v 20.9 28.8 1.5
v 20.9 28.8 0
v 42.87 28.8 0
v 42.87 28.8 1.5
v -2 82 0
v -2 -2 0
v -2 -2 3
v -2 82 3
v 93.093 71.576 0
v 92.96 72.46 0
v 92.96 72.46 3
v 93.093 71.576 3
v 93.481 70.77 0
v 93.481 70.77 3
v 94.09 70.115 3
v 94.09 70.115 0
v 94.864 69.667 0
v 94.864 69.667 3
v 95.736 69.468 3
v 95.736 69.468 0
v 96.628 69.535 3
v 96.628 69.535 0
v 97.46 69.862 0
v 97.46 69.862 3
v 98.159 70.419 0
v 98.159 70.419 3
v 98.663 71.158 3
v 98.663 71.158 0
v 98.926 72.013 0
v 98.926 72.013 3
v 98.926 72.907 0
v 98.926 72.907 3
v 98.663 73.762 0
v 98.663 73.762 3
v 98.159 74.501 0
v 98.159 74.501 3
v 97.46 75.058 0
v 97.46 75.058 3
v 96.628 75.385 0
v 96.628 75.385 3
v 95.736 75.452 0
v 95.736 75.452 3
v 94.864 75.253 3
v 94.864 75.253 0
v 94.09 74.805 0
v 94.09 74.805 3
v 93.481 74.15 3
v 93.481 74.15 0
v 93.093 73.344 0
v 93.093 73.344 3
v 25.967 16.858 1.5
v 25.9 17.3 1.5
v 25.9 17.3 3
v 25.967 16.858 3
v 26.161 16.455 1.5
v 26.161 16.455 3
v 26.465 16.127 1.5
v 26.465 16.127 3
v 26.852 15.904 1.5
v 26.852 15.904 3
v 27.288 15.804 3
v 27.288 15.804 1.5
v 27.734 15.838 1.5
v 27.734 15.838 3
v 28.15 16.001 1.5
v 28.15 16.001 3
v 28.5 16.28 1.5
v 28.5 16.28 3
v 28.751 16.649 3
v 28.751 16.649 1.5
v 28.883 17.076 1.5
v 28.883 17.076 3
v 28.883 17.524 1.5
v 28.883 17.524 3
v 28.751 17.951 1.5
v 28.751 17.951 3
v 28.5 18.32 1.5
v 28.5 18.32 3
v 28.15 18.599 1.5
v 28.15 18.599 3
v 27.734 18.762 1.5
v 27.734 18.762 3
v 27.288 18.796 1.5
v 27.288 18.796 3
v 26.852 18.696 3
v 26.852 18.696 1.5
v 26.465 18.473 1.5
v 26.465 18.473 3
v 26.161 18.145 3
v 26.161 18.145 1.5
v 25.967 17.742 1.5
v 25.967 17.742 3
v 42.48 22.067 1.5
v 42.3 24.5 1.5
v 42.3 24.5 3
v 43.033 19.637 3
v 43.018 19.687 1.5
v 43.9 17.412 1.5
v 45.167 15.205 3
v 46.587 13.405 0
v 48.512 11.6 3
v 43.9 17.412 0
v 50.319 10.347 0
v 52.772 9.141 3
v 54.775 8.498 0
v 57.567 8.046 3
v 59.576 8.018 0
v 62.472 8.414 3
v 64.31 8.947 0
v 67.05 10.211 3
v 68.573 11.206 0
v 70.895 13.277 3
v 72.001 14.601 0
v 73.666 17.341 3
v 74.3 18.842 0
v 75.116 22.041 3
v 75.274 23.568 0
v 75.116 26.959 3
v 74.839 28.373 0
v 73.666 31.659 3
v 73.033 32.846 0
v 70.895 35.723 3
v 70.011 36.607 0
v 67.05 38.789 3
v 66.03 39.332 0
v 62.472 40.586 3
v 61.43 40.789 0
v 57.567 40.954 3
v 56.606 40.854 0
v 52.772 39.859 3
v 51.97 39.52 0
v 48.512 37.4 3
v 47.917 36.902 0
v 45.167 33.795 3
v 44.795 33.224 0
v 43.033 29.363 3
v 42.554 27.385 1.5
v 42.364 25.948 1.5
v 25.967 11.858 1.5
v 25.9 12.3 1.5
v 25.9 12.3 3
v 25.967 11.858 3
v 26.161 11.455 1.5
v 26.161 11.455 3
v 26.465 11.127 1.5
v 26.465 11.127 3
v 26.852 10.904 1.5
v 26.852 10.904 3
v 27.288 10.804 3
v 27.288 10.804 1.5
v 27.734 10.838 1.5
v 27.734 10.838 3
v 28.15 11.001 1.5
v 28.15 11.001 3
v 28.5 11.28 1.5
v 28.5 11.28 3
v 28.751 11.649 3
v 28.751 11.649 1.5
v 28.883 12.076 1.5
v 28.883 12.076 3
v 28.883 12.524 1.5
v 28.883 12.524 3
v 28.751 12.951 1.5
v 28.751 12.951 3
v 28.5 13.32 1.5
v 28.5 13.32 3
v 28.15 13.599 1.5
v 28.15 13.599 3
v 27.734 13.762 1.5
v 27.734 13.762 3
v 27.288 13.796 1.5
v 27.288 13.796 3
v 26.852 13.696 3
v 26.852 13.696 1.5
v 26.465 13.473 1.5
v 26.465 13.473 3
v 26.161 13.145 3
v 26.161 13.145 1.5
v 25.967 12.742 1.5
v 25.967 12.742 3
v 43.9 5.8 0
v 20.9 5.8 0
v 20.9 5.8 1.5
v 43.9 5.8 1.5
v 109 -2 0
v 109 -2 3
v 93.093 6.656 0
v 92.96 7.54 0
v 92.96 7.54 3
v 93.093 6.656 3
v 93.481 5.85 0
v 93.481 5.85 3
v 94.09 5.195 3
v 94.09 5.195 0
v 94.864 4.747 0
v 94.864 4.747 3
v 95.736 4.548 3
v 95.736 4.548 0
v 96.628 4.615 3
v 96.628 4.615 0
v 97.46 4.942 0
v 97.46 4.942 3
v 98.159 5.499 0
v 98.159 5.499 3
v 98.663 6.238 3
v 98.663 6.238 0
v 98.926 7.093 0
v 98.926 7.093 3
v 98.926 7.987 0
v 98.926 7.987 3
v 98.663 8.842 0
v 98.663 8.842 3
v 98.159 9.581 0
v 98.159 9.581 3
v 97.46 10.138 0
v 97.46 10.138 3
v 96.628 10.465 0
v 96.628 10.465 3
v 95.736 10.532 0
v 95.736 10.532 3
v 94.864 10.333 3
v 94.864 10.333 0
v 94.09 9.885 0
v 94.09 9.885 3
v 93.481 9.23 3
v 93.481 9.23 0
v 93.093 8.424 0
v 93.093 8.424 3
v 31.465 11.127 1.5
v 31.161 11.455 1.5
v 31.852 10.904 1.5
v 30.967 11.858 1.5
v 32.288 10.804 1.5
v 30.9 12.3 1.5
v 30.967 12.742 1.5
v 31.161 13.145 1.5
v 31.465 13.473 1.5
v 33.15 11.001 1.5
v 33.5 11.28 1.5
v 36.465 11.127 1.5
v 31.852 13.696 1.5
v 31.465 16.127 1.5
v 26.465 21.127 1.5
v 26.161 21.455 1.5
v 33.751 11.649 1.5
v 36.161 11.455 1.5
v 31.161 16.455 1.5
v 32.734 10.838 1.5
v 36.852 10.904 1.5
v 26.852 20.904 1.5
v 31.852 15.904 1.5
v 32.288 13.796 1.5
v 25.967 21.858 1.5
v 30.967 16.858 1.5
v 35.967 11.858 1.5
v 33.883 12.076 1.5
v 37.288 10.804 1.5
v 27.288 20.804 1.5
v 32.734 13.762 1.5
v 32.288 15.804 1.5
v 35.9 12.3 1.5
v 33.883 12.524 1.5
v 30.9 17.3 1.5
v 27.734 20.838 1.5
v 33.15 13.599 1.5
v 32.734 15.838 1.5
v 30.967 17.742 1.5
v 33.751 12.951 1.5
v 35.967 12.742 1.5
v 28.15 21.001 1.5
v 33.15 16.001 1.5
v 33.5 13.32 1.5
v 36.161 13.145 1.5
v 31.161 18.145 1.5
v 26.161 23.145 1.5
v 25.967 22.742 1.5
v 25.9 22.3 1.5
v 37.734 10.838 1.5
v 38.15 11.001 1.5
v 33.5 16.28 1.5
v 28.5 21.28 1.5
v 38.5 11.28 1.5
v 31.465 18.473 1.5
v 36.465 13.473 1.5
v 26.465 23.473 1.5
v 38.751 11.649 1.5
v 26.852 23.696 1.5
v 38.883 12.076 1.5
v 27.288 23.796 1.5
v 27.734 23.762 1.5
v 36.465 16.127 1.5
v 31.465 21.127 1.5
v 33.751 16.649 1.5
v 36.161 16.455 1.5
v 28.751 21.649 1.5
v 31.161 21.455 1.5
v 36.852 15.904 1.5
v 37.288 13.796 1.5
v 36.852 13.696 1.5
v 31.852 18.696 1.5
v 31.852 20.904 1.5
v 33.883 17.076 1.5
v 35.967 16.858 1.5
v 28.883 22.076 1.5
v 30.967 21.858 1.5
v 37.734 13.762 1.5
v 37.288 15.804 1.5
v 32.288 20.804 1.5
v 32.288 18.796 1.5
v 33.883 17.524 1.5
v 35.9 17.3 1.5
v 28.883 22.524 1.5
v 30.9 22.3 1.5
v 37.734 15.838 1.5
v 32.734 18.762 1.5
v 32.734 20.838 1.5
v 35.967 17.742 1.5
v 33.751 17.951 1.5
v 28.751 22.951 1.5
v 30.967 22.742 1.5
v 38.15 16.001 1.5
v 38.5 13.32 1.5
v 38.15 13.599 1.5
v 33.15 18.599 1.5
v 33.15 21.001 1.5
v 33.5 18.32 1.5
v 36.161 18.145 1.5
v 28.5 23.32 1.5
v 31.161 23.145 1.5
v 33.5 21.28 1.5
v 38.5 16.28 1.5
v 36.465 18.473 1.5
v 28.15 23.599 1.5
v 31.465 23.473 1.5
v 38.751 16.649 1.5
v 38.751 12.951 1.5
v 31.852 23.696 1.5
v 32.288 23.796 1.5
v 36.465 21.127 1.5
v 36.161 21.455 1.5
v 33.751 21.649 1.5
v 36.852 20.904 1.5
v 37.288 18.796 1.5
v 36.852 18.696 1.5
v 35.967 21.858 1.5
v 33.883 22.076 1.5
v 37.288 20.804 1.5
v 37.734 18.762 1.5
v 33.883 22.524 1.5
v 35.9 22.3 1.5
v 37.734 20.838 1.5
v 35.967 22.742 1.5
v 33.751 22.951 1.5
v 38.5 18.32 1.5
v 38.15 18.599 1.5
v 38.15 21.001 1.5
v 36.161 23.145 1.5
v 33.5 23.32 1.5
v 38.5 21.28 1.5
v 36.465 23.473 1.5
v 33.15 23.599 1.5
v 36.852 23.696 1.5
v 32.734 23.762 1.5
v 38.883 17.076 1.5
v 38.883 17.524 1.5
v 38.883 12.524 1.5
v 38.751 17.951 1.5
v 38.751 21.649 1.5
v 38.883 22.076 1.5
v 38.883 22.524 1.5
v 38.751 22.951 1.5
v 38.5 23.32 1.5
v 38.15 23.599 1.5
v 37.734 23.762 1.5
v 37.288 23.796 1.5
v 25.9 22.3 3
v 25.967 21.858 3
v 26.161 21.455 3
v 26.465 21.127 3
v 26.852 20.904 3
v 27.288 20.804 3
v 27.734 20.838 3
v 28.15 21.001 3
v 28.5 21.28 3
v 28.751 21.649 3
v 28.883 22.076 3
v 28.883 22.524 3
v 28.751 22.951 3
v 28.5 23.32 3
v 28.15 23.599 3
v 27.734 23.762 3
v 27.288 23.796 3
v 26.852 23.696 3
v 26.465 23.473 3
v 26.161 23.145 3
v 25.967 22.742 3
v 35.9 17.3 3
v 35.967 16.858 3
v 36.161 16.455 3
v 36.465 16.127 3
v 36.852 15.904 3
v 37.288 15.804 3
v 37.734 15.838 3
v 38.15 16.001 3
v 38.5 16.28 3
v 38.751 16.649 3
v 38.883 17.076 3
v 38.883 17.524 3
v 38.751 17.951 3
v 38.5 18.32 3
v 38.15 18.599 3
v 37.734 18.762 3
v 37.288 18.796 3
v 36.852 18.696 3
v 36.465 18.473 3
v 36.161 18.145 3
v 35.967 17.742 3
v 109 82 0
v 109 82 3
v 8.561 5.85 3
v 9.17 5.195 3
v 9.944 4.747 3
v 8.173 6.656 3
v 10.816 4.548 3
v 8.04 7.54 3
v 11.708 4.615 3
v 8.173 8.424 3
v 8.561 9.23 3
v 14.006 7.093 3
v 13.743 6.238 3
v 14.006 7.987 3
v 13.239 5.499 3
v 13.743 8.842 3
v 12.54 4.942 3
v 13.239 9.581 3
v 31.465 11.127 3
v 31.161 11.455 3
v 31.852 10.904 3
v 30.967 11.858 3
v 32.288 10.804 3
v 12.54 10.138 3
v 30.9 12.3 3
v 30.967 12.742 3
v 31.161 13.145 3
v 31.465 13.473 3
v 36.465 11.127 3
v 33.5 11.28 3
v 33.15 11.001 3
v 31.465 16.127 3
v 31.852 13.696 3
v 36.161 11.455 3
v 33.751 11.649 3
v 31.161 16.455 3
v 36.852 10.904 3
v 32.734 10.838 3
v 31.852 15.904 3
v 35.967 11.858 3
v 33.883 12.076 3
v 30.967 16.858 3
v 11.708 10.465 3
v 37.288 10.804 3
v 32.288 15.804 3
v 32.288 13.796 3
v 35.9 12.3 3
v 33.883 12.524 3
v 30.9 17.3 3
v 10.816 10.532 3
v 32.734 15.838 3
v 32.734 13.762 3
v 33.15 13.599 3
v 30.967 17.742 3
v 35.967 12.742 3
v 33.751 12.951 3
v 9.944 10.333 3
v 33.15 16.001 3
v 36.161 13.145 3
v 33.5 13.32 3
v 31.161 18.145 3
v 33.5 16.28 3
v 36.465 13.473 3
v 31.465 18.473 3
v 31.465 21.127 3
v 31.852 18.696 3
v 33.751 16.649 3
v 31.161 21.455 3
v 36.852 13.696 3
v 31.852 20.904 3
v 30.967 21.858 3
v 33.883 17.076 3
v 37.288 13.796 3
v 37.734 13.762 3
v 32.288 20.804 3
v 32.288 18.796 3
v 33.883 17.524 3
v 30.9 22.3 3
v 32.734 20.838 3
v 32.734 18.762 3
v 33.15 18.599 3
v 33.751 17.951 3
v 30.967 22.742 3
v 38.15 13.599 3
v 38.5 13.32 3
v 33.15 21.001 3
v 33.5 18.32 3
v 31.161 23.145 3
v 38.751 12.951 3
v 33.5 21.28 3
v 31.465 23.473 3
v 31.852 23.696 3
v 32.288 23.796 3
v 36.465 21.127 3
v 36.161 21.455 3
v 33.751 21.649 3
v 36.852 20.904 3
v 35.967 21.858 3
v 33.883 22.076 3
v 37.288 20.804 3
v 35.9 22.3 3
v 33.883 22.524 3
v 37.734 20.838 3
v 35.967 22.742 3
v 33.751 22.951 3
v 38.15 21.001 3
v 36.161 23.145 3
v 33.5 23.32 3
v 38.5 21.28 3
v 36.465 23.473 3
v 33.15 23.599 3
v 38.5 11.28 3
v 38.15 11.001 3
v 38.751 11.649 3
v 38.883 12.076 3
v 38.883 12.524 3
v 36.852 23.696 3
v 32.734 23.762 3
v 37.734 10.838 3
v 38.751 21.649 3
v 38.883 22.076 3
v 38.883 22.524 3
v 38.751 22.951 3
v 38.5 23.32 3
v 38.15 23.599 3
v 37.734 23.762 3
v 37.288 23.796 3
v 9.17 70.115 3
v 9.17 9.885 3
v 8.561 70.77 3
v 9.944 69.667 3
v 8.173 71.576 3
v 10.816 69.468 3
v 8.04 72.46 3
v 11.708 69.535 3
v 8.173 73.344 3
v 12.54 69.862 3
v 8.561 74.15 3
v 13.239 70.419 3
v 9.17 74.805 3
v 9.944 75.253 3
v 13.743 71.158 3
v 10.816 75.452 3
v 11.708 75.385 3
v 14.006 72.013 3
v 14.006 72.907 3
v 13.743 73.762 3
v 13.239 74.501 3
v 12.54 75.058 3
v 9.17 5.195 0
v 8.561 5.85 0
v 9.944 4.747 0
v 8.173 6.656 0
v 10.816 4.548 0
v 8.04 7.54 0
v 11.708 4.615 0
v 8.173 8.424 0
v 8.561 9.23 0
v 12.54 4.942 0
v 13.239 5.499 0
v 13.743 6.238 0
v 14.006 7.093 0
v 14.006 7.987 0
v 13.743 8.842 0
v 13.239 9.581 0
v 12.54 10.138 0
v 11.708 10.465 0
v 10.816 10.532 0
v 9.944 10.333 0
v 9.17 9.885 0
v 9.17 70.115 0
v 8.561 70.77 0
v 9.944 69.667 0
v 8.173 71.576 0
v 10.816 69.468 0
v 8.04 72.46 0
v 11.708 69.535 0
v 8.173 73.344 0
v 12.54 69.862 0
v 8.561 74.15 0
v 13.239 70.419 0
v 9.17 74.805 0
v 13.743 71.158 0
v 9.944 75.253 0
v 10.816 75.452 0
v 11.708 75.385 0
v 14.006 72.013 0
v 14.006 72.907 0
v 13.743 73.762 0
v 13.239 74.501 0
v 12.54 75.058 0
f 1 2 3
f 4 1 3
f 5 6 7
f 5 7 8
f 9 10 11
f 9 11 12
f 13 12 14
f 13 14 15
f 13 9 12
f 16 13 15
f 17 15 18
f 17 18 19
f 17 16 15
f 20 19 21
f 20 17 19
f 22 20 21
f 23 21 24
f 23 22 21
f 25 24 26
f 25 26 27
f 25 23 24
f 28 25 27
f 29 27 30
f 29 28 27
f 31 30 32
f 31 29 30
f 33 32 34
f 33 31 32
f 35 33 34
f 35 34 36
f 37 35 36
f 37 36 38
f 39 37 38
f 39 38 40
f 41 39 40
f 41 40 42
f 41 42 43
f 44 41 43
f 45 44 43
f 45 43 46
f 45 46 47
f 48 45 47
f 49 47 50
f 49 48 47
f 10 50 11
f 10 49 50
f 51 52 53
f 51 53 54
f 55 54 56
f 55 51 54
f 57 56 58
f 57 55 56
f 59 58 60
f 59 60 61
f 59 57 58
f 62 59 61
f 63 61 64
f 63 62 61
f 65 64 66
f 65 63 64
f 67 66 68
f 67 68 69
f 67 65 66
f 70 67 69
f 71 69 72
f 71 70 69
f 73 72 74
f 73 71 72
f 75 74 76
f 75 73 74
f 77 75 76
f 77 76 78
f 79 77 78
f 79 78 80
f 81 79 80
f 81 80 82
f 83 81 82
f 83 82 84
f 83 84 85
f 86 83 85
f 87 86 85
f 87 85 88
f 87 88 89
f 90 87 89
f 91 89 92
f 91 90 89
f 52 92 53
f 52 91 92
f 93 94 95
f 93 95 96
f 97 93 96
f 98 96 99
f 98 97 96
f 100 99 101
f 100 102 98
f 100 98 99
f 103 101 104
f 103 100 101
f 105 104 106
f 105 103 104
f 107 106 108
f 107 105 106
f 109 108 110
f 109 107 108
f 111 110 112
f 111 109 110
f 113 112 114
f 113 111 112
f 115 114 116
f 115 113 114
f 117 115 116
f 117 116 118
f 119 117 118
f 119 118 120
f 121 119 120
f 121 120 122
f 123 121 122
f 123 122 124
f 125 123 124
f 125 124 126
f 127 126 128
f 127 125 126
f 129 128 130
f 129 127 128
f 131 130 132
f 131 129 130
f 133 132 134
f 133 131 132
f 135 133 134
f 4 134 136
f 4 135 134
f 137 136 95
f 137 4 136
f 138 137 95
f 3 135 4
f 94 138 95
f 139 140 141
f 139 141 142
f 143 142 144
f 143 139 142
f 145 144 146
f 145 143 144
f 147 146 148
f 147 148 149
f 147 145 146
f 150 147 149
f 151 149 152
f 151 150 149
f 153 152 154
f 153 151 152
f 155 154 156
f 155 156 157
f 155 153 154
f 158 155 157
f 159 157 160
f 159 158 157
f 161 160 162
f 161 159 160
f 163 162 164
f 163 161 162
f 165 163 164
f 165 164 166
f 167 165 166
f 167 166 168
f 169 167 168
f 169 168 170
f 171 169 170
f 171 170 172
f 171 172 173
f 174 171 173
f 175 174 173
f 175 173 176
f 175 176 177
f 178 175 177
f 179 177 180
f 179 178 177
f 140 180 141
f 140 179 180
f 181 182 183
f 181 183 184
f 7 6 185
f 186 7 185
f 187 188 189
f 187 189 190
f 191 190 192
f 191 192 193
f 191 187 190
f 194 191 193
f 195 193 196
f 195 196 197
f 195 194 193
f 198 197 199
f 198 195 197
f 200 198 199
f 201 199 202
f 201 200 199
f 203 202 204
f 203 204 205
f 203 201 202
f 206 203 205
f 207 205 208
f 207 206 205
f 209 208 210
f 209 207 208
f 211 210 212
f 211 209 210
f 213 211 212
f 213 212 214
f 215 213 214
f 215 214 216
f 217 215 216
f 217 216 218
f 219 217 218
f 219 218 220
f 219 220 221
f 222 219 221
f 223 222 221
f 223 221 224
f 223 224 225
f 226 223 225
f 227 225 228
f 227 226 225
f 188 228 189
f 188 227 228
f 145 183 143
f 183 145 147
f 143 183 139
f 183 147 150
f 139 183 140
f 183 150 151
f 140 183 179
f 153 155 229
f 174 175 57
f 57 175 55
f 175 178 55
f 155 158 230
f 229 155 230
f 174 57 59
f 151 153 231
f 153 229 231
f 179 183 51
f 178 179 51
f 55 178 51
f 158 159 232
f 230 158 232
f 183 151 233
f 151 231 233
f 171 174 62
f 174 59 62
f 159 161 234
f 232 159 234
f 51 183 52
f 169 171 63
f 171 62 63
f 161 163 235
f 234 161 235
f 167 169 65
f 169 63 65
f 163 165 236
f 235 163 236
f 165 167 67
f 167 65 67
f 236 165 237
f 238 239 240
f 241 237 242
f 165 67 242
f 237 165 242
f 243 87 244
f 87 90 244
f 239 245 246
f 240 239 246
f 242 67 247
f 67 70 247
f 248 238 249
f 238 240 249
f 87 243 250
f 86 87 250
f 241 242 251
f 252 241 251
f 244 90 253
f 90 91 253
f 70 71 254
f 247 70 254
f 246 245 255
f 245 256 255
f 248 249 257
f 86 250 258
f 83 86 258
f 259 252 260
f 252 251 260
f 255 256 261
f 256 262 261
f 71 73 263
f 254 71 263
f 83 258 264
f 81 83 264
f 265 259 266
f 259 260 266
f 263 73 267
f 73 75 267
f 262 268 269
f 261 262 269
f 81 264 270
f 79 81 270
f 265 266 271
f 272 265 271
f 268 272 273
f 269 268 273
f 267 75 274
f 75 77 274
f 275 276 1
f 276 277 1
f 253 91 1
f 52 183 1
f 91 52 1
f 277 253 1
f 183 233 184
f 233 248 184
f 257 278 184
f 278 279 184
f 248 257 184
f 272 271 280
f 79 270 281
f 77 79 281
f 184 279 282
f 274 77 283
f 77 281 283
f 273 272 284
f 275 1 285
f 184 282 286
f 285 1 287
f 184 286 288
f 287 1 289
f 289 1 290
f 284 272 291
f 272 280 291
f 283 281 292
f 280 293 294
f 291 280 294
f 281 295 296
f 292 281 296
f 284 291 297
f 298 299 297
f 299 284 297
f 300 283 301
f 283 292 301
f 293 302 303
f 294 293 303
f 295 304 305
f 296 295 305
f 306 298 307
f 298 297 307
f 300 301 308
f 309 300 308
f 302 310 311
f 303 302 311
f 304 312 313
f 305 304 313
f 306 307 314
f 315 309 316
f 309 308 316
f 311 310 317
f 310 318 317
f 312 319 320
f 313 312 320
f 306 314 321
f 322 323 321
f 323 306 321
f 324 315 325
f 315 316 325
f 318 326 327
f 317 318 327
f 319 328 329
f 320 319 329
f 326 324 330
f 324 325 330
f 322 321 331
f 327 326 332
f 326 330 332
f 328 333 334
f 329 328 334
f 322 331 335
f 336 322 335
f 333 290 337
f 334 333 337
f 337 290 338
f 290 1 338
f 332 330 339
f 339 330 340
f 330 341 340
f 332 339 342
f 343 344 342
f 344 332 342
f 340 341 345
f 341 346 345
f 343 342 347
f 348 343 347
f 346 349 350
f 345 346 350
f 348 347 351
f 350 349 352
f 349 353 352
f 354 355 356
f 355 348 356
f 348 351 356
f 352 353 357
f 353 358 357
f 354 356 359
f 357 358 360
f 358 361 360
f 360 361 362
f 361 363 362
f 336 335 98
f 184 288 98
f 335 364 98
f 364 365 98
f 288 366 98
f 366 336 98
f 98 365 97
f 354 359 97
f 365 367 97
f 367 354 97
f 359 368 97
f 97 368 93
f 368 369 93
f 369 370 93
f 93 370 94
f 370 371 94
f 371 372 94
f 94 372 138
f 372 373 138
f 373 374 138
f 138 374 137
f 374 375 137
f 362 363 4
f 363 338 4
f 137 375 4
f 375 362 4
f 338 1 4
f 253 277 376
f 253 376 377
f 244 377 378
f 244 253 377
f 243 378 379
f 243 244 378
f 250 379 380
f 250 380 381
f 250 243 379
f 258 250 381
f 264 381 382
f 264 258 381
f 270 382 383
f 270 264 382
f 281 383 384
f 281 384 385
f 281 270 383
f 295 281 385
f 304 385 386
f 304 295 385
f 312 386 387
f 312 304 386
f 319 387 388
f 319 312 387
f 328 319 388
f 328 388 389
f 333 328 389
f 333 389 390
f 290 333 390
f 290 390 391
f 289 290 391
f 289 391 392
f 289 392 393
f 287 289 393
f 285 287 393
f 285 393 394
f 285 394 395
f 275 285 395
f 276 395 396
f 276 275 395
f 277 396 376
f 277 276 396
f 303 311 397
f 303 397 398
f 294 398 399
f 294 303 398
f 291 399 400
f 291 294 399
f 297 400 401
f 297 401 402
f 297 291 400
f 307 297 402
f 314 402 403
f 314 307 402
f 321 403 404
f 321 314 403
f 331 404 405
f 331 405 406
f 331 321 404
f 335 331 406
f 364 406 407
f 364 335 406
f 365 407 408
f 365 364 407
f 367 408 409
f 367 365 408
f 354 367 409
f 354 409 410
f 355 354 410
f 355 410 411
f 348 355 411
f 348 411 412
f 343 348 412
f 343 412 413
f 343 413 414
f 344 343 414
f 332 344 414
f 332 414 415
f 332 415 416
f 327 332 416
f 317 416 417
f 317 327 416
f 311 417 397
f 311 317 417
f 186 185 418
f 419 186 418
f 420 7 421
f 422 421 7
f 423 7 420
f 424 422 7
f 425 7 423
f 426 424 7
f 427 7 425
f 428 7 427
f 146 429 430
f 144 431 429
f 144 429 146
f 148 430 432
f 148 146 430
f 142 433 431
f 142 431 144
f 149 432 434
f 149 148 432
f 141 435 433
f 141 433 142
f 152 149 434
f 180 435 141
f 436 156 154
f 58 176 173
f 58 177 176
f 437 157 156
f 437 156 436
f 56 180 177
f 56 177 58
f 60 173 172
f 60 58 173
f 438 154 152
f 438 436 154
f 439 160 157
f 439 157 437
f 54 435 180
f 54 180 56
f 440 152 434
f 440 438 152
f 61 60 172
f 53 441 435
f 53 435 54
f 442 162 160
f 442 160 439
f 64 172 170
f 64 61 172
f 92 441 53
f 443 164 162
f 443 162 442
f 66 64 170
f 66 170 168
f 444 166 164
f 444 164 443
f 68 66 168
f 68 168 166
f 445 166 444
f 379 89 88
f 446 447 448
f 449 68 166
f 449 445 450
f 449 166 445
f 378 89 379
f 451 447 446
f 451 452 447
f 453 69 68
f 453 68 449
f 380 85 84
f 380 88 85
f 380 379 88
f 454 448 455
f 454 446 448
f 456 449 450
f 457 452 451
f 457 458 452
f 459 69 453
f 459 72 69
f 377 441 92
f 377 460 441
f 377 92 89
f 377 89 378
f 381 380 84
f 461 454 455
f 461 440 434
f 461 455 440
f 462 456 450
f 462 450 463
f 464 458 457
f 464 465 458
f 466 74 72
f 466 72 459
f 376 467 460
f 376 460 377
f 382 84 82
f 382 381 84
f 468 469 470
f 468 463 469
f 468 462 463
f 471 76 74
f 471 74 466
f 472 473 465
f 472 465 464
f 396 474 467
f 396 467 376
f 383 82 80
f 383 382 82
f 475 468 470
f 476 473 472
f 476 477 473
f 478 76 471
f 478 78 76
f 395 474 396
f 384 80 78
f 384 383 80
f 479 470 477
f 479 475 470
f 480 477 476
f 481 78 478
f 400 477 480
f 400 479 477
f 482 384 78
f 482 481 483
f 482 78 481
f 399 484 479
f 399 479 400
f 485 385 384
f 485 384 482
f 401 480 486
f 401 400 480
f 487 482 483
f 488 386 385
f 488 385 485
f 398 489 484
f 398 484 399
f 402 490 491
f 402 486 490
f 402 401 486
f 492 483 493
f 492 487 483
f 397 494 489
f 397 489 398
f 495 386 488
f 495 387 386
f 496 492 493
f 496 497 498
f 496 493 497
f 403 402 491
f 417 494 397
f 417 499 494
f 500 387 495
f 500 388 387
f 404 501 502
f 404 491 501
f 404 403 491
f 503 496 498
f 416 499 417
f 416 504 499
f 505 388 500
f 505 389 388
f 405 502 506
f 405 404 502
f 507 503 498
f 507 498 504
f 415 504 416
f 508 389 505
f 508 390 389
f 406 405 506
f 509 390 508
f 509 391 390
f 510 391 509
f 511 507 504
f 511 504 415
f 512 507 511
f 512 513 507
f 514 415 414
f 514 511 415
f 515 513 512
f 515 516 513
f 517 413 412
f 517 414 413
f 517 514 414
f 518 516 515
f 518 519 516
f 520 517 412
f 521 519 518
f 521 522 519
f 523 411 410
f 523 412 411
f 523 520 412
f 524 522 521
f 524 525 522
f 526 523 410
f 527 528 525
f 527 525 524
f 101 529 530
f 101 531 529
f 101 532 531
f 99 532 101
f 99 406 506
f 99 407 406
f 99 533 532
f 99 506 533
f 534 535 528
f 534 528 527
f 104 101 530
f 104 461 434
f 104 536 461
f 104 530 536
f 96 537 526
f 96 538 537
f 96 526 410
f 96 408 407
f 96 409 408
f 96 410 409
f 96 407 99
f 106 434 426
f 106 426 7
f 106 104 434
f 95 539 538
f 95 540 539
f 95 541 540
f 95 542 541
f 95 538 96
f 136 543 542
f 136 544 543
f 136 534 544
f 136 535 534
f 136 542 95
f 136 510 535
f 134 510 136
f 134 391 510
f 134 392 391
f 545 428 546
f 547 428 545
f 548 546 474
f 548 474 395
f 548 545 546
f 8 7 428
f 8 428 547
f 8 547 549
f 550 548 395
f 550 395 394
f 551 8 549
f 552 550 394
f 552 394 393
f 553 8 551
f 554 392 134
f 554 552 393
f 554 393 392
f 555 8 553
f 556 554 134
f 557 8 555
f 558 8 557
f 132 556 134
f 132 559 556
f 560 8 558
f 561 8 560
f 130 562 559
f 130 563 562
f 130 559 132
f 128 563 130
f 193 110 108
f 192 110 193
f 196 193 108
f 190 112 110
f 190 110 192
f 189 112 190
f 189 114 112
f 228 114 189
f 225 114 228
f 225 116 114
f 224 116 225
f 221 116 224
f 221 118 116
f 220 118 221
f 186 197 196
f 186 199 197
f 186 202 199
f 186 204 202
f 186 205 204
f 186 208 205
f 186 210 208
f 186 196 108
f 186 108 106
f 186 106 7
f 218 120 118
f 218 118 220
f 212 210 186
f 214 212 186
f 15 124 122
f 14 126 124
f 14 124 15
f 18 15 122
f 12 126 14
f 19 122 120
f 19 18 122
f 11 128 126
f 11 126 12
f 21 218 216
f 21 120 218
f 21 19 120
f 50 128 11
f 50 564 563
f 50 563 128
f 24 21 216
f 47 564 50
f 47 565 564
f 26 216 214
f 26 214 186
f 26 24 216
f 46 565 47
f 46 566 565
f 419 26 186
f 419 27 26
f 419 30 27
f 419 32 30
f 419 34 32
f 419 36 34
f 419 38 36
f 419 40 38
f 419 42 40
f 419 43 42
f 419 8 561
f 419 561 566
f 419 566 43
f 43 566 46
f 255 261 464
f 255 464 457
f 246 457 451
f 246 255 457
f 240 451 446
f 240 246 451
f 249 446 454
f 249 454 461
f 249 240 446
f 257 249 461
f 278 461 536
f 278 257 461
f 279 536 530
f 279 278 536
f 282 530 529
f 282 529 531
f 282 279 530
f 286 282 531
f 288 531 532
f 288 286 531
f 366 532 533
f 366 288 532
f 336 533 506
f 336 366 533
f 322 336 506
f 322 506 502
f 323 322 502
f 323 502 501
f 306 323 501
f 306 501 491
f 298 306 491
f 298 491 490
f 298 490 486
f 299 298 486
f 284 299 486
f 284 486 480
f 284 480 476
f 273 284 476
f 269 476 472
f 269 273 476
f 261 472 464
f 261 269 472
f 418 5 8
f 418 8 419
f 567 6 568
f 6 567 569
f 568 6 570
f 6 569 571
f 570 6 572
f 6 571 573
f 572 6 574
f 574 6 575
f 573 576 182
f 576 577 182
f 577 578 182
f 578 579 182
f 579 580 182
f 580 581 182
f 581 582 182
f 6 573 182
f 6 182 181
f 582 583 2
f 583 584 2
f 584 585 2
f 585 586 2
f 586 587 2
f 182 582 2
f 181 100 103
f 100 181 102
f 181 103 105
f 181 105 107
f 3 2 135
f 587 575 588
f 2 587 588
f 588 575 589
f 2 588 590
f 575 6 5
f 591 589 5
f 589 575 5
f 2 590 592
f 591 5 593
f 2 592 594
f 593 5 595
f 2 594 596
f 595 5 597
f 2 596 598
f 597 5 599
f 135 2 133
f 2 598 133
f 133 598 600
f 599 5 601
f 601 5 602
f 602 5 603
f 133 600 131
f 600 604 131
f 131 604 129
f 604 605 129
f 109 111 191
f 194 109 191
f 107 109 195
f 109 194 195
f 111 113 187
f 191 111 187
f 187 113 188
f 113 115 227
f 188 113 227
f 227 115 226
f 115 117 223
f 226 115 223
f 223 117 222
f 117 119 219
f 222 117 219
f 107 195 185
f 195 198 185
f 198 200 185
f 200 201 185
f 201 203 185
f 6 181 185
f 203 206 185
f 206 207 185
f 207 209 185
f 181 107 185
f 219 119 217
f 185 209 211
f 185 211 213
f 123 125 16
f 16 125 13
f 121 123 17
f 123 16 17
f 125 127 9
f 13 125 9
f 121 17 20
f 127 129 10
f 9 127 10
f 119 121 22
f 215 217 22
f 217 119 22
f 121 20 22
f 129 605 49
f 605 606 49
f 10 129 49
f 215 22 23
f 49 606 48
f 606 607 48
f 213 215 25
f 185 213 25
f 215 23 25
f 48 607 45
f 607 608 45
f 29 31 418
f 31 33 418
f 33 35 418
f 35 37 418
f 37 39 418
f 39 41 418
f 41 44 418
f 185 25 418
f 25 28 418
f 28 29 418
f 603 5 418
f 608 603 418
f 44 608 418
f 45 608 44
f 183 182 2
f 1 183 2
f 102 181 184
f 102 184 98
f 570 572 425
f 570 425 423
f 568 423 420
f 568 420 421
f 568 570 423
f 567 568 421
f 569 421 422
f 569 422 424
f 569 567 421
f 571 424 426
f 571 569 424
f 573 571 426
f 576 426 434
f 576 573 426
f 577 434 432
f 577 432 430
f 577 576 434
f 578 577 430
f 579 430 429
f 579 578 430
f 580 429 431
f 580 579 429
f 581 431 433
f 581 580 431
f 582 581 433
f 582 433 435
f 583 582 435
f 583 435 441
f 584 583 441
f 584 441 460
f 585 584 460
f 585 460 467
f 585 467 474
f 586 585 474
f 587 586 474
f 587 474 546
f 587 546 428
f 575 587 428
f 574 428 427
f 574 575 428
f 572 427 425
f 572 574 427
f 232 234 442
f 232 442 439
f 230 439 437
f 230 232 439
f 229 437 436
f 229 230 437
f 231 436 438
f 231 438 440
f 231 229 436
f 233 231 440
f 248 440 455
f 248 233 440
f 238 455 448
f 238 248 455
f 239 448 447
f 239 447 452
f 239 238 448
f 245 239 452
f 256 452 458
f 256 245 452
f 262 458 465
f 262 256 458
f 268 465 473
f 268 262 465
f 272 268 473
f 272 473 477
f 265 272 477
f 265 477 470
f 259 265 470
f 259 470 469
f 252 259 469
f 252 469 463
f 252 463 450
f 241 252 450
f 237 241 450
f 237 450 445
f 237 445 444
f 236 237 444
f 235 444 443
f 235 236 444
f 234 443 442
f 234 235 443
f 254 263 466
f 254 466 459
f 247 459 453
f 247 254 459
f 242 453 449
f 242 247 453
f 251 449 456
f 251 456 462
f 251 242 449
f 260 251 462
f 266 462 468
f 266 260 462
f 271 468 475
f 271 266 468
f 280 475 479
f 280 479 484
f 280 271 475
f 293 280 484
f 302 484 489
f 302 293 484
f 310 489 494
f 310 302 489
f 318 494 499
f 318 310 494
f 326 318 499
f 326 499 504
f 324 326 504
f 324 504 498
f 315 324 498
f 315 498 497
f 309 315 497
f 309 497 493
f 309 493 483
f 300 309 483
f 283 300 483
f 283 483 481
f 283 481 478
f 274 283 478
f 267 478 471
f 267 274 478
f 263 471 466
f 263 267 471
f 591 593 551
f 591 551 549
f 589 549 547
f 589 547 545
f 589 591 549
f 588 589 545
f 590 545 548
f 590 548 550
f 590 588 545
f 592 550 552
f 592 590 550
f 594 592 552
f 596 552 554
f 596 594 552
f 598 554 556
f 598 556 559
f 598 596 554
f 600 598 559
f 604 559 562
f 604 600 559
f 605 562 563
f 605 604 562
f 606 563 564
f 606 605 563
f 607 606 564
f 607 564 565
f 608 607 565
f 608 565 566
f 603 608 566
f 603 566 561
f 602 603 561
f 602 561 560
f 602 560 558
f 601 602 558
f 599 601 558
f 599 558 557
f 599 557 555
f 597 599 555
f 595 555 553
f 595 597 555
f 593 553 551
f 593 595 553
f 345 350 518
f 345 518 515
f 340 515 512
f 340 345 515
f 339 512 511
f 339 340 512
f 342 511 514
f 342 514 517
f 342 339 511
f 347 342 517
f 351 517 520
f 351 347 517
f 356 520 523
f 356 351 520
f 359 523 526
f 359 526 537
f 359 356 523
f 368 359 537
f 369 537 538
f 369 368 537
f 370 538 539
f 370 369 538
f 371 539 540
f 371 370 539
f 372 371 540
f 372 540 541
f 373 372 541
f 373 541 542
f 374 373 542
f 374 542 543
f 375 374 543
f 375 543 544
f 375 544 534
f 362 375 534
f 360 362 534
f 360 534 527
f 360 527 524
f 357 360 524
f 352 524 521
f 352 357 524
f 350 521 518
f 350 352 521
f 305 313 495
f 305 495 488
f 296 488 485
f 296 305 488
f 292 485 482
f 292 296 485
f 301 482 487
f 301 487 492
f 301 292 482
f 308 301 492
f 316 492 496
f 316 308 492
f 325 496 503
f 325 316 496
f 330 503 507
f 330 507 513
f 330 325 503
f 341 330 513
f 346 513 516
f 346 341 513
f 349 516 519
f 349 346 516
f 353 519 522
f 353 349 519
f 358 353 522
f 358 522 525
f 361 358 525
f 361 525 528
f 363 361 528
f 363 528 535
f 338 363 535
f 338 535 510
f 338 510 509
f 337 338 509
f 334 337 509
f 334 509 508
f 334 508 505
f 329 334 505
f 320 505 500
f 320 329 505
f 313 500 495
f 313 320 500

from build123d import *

# Parameters (mm, degrees)
SKETCH_1_W                                = 111
SKETCH_1_H                                = 84
BOTTOM_LOWER_BASE_PLATE_3MM_DEPTH         = 3
SKETCH_3_R                                = 3
BOTTOM_LOWER_SCREW_6MM_THROUGH_DEPTH      = 3
SKETCH_5_R                                = 16.5
BOTTOM_LOWER_BATTERY_CLEARANCE_33MM_DEPTH = 3
SKETCH_7_W                                = 23
SKETCH_7_H                                = 23
BOTTOM_LOWER_BUZZER_POCKET_1P5MM_DEPTH    = 1.5
BOTTOM_LOWER_BUZZER_SOUND_HOLES_3MM_START = 1.5
SKETCH_9_R                                = 1.5
BOTTOM_LOWER_BUZZER_SOUND_HOLES_3MM_DEPTH = 1.5


with BuildPart() as part:
    # Эскиз1 → bottom_lower_base_plate_3mm (new body)
    with BuildSketch(Plane.XY):
        with Locations((53.5, 40)):
            Rectangle(SKETCH_1_W, SKETCH_1_H)
    extrude(amount=BOTTOM_LOWER_BASE_PLATE_3MM_DEPTH)

    # Эскиз3 → bottom_lower_screw_6mm_through (cut)
    with BuildSketch(Plane.XY):
        with Locations(Location((11.04, 7.54, 0), (0, 0, 180))):
            Circle(SKETCH_3_R)
        with Locations(Location((95.96, 7.54, 0), (0, 0, 180))):
            Circle(SKETCH_3_R)
        with Locations(Location((11.04, 72.46, 0), (0, 0, 180))):
            Circle(SKETCH_3_R)
        with Locations(Location((95.96, 72.46, 0), (0, 0, 180))):
            Circle(SKETCH_3_R)
    extrude(amount=BOTTOM_LOWER_SCREW_6MM_THROUGH_DEPTH, mode=Mode.SUBTRACT)

    # Эскиз5 → bottom_lower_battery_clearance_33mm (cut)
    with BuildSketch(Plane.XY):
        with Locations(Location((58.8, 24.5, 0), (0, 0, 180))):
            Circle(SKETCH_5_R)
    extrude(amount=BOTTOM_LOWER_BATTERY_CLEARANCE_33MM_DEPTH, mode=Mode.SUBTRACT)

    # Эскиз7 → bottom_lower_buzzer_pocket_1p5mm (cut)
    with BuildSketch(Plane.XY):
        with Locations((32.4, 17.3)):
            Rectangle(SKETCH_7_W, SKETCH_7_H)
    extrude(amount=BOTTOM_LOWER_BUZZER_POCKET_1P5MM_DEPTH, mode=Mode.SUBTRACT)

    # Эскиз9 → bottom_lower_buzzer_sound_holes_3mm (cut)
    with BuildSketch(Plane.XY.offset(BOTTOM_LOWER_BUZZER_SOUND_HOLES_3MM_START)):
        with Locations(Location((27.4, 12.3, 0), (0, 0, 180))):
            Circle(SKETCH_9_R)
        with Locations(Location((27.4, 17.3, 0), (0, 0, 180))):
            Circle(SKETCH_9_R)
        with Locations(Location((27.4, 22.3, 0), (0, 0, 180))):
            Circle(SKETCH_9_R)
        with Locations(Location((32.4, 12.3, 0), (0, 0, 180))):
            Circle(SKETCH_9_R)
        with Locations(Location((32.4, 17.3, 0), (0, 0, 180))):
            Circle(SKETCH_9_R)
        with Locations(Location((32.4, 22.3, 0), (0, 0, 180))):
            Circle(SKETCH_9_R)
        with Locations(Location((37.4, 12.3, 0), (0, 0, 180))):
            Circle(SKETCH_9_R)
        with Locations(Location((37.4, 17.3, 0), (0, 0, 180))):
            Circle(SKETCH_9_R)
        with Locations(Location((37.4, 22.3, 0), (0, 0, 180))):
            Circle(SKETCH_9_R)
    extrude(amount=BOTTOM_LOWER_BUZZER_SOUND_HOLES_3MM_DEPTH, mode=Mode.SUBTRACT)


solid = part.part
